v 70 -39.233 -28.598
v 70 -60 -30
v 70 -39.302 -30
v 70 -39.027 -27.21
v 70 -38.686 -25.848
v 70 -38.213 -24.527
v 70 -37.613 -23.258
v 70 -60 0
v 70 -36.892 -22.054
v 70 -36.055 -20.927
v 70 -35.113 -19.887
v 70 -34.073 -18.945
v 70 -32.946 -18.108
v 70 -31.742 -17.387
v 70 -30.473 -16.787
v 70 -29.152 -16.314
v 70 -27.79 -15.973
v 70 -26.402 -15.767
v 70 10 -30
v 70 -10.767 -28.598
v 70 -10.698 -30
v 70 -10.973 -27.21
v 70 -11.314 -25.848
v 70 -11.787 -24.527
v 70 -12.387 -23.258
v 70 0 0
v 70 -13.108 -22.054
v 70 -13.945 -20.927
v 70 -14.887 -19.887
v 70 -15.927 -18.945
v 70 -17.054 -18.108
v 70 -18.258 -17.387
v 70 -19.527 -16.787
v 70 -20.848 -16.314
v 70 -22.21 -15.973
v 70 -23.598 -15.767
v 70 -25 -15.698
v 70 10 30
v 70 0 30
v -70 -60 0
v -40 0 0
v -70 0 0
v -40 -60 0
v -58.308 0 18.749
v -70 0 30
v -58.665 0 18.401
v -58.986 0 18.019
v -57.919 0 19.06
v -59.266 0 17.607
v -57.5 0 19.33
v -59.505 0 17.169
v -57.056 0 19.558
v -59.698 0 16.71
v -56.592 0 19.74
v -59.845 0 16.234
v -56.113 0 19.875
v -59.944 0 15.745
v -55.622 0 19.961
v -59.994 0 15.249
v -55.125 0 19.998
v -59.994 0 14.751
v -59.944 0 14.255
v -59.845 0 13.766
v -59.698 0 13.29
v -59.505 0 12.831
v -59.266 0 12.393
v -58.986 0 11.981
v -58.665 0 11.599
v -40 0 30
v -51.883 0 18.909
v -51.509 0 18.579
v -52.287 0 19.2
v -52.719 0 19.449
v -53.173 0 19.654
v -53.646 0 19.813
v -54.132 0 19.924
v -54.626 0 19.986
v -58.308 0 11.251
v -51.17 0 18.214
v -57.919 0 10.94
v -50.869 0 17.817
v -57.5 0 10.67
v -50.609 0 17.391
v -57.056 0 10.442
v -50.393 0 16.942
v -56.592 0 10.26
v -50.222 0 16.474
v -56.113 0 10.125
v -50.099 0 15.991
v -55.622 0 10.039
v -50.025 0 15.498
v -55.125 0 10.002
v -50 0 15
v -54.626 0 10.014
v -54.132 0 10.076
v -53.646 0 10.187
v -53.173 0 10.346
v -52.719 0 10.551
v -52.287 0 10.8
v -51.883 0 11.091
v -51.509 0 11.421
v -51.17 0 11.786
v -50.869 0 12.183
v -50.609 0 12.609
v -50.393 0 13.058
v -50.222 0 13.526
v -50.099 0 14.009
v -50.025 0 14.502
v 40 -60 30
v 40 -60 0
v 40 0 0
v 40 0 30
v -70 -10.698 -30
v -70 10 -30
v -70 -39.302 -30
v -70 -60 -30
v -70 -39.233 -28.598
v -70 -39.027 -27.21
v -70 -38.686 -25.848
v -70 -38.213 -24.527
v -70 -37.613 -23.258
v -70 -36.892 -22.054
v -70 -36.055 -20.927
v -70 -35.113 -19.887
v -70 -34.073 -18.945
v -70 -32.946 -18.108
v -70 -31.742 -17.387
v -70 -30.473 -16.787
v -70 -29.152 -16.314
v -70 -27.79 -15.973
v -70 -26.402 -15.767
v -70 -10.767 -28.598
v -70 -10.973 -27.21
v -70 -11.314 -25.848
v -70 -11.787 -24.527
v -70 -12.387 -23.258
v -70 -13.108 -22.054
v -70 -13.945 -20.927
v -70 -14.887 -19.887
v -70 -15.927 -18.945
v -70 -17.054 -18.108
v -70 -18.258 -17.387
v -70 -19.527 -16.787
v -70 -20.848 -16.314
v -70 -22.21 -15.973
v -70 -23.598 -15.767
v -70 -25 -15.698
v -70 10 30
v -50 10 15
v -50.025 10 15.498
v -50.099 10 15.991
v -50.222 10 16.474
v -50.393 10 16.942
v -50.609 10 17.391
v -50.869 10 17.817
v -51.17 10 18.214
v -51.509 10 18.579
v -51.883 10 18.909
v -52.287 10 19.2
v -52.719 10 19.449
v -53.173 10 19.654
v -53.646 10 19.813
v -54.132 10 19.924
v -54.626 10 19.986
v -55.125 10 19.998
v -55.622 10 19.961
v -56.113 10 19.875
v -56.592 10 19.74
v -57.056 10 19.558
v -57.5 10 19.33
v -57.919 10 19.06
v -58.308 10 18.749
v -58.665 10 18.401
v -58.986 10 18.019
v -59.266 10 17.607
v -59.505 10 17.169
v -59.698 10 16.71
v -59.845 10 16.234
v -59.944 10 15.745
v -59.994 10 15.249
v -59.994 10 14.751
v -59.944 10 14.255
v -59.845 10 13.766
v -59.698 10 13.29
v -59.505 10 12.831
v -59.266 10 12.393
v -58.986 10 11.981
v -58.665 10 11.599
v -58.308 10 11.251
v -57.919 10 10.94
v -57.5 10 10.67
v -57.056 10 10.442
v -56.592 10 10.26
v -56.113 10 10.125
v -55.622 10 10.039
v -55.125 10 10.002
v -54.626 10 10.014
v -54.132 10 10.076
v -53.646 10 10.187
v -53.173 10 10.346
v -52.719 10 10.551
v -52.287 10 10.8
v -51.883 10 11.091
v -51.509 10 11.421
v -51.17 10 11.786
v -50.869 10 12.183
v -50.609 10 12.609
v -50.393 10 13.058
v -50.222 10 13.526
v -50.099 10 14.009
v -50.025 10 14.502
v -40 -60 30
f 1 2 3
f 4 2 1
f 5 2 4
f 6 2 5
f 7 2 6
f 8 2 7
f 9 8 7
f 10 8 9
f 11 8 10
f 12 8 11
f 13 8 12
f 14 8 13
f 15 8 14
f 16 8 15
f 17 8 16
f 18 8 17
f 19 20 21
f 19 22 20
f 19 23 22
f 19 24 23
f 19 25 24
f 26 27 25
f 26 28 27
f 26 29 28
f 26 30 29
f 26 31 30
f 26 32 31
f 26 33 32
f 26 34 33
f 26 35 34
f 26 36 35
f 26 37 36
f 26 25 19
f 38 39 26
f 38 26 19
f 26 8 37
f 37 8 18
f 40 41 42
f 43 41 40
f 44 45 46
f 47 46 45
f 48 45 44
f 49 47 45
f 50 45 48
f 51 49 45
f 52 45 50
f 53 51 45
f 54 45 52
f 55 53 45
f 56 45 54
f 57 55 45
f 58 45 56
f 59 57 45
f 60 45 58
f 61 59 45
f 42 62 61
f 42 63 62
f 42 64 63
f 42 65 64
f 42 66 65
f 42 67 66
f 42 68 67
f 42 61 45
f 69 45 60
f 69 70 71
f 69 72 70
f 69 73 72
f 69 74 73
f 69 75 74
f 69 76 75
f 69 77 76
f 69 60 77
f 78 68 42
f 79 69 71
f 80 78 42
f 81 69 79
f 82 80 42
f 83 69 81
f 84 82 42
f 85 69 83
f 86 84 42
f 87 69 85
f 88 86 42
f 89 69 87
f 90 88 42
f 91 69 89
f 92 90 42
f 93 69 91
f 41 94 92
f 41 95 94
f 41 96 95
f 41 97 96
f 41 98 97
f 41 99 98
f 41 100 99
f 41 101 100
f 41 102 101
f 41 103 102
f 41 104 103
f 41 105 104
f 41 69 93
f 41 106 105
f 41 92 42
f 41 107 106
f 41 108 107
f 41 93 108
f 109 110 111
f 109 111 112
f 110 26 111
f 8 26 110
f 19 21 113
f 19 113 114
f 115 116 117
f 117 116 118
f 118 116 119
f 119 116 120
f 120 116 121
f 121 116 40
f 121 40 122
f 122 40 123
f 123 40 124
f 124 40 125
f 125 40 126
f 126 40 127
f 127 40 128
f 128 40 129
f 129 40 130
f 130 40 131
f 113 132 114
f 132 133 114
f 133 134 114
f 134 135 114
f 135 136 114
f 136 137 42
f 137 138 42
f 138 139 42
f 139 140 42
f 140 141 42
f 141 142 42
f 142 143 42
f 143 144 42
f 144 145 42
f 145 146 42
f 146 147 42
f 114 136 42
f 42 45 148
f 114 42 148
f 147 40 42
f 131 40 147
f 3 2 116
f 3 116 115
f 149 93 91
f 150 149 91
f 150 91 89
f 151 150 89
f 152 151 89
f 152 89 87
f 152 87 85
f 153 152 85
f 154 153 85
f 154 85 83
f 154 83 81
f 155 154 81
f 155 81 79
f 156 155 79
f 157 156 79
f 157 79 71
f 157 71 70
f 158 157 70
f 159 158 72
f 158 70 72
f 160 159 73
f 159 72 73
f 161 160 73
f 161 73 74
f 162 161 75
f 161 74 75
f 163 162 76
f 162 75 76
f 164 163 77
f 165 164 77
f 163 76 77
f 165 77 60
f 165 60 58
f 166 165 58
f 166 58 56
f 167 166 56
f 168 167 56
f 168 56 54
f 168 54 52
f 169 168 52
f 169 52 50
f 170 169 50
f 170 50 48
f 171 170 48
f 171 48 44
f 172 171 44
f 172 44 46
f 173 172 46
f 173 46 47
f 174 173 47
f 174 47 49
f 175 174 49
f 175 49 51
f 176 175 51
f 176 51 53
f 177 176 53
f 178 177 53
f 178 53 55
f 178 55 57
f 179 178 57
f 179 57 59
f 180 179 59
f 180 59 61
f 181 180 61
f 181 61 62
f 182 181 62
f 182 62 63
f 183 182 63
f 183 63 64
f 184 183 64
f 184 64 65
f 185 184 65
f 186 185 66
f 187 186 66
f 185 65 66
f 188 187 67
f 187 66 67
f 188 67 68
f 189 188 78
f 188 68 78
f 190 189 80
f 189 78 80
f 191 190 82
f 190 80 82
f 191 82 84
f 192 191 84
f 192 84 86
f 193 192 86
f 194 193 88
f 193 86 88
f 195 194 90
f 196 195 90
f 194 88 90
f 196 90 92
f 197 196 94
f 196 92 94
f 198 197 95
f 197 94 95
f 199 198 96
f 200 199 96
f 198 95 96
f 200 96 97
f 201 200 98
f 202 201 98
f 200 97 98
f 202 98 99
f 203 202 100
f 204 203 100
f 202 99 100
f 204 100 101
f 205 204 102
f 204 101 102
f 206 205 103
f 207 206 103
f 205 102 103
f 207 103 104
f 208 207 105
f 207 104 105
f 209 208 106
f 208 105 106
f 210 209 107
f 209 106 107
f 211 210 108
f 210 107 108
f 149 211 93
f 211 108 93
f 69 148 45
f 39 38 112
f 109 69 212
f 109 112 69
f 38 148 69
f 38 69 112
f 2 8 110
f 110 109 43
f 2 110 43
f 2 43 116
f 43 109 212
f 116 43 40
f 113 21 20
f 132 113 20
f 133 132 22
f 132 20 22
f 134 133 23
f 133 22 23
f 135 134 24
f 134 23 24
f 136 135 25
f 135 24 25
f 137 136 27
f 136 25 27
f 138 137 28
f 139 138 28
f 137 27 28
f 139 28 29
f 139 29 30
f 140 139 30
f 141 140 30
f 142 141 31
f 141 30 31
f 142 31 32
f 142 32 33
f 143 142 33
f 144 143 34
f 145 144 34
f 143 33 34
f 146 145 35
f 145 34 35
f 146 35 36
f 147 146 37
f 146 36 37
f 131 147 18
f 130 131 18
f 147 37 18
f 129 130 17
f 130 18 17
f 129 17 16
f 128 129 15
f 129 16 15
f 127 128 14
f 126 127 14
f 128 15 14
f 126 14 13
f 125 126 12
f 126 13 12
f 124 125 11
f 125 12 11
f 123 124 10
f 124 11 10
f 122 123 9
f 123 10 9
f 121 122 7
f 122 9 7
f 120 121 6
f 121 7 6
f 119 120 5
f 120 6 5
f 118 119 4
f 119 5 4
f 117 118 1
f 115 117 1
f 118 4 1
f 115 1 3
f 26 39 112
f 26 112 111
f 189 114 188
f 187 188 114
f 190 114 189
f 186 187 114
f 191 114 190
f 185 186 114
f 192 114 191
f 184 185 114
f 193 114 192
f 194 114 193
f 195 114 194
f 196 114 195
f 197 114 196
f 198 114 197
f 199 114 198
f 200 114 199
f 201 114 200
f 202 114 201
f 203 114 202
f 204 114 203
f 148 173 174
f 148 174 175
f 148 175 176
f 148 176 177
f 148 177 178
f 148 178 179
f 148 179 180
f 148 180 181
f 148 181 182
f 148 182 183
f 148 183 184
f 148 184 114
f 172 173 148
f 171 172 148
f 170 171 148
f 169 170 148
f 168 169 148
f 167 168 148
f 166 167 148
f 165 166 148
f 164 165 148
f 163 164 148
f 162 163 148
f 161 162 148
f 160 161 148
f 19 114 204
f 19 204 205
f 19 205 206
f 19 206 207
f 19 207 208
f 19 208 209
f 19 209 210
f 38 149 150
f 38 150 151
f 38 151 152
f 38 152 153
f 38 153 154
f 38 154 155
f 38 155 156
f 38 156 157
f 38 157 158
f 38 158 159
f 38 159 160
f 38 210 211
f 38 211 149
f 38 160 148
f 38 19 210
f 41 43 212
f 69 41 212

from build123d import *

# Parameters (mm, degrees)
F1_DEPTH = 70
F2_R     = 14.3018330781
F3_DEPTH = 87.7
F4_W     = 40
F4_H     = 30
F5_DEPTH = 60
F7_R     = 5
F8_DEPTH = 86.3


with BuildPart() as f1:
    # F0 (on Right) → F1 (new body, symmetric)
    with BuildSketch(Plane.YZ):
        Polygon((0, 30), (0, 0), (-60, 0), (-60, -30), (10, -30), (10, 30), align=None)
    extrude(amount=F1_DEPTH, both=True)

    # F2 (on Right) → F3 (cut, symmetric)
    with BuildSketch(Plane.YZ):
        with Locations((-25, -30)):
            Circle(F2_R)
    extrude(amount=F3_DEPTH, both=True, mode=Mode.SUBTRACT)

    # F4 (on Front) → F5 (join)
    with BuildSketch(Plane.XZ):
        with Locations((20, 15)):
            Rectangle(F4_W, F4_H)
    extrude(amount=F5_DEPTH)

    # F6: F1 across plane


with BuildPart() as f1_1:
    add(f1.part)
    add(f1.part.mirror(Plane.YZ))

    # F7 (on face) → F8 (cut)
    with BuildSketch(Plane.XZ):
        with Locations((-55, 15)):
            Circle(F7_R)
    extrude(amount=-F8_DEPTH, mode=Mode.SUBTRACT)


solid = f1_1.part
